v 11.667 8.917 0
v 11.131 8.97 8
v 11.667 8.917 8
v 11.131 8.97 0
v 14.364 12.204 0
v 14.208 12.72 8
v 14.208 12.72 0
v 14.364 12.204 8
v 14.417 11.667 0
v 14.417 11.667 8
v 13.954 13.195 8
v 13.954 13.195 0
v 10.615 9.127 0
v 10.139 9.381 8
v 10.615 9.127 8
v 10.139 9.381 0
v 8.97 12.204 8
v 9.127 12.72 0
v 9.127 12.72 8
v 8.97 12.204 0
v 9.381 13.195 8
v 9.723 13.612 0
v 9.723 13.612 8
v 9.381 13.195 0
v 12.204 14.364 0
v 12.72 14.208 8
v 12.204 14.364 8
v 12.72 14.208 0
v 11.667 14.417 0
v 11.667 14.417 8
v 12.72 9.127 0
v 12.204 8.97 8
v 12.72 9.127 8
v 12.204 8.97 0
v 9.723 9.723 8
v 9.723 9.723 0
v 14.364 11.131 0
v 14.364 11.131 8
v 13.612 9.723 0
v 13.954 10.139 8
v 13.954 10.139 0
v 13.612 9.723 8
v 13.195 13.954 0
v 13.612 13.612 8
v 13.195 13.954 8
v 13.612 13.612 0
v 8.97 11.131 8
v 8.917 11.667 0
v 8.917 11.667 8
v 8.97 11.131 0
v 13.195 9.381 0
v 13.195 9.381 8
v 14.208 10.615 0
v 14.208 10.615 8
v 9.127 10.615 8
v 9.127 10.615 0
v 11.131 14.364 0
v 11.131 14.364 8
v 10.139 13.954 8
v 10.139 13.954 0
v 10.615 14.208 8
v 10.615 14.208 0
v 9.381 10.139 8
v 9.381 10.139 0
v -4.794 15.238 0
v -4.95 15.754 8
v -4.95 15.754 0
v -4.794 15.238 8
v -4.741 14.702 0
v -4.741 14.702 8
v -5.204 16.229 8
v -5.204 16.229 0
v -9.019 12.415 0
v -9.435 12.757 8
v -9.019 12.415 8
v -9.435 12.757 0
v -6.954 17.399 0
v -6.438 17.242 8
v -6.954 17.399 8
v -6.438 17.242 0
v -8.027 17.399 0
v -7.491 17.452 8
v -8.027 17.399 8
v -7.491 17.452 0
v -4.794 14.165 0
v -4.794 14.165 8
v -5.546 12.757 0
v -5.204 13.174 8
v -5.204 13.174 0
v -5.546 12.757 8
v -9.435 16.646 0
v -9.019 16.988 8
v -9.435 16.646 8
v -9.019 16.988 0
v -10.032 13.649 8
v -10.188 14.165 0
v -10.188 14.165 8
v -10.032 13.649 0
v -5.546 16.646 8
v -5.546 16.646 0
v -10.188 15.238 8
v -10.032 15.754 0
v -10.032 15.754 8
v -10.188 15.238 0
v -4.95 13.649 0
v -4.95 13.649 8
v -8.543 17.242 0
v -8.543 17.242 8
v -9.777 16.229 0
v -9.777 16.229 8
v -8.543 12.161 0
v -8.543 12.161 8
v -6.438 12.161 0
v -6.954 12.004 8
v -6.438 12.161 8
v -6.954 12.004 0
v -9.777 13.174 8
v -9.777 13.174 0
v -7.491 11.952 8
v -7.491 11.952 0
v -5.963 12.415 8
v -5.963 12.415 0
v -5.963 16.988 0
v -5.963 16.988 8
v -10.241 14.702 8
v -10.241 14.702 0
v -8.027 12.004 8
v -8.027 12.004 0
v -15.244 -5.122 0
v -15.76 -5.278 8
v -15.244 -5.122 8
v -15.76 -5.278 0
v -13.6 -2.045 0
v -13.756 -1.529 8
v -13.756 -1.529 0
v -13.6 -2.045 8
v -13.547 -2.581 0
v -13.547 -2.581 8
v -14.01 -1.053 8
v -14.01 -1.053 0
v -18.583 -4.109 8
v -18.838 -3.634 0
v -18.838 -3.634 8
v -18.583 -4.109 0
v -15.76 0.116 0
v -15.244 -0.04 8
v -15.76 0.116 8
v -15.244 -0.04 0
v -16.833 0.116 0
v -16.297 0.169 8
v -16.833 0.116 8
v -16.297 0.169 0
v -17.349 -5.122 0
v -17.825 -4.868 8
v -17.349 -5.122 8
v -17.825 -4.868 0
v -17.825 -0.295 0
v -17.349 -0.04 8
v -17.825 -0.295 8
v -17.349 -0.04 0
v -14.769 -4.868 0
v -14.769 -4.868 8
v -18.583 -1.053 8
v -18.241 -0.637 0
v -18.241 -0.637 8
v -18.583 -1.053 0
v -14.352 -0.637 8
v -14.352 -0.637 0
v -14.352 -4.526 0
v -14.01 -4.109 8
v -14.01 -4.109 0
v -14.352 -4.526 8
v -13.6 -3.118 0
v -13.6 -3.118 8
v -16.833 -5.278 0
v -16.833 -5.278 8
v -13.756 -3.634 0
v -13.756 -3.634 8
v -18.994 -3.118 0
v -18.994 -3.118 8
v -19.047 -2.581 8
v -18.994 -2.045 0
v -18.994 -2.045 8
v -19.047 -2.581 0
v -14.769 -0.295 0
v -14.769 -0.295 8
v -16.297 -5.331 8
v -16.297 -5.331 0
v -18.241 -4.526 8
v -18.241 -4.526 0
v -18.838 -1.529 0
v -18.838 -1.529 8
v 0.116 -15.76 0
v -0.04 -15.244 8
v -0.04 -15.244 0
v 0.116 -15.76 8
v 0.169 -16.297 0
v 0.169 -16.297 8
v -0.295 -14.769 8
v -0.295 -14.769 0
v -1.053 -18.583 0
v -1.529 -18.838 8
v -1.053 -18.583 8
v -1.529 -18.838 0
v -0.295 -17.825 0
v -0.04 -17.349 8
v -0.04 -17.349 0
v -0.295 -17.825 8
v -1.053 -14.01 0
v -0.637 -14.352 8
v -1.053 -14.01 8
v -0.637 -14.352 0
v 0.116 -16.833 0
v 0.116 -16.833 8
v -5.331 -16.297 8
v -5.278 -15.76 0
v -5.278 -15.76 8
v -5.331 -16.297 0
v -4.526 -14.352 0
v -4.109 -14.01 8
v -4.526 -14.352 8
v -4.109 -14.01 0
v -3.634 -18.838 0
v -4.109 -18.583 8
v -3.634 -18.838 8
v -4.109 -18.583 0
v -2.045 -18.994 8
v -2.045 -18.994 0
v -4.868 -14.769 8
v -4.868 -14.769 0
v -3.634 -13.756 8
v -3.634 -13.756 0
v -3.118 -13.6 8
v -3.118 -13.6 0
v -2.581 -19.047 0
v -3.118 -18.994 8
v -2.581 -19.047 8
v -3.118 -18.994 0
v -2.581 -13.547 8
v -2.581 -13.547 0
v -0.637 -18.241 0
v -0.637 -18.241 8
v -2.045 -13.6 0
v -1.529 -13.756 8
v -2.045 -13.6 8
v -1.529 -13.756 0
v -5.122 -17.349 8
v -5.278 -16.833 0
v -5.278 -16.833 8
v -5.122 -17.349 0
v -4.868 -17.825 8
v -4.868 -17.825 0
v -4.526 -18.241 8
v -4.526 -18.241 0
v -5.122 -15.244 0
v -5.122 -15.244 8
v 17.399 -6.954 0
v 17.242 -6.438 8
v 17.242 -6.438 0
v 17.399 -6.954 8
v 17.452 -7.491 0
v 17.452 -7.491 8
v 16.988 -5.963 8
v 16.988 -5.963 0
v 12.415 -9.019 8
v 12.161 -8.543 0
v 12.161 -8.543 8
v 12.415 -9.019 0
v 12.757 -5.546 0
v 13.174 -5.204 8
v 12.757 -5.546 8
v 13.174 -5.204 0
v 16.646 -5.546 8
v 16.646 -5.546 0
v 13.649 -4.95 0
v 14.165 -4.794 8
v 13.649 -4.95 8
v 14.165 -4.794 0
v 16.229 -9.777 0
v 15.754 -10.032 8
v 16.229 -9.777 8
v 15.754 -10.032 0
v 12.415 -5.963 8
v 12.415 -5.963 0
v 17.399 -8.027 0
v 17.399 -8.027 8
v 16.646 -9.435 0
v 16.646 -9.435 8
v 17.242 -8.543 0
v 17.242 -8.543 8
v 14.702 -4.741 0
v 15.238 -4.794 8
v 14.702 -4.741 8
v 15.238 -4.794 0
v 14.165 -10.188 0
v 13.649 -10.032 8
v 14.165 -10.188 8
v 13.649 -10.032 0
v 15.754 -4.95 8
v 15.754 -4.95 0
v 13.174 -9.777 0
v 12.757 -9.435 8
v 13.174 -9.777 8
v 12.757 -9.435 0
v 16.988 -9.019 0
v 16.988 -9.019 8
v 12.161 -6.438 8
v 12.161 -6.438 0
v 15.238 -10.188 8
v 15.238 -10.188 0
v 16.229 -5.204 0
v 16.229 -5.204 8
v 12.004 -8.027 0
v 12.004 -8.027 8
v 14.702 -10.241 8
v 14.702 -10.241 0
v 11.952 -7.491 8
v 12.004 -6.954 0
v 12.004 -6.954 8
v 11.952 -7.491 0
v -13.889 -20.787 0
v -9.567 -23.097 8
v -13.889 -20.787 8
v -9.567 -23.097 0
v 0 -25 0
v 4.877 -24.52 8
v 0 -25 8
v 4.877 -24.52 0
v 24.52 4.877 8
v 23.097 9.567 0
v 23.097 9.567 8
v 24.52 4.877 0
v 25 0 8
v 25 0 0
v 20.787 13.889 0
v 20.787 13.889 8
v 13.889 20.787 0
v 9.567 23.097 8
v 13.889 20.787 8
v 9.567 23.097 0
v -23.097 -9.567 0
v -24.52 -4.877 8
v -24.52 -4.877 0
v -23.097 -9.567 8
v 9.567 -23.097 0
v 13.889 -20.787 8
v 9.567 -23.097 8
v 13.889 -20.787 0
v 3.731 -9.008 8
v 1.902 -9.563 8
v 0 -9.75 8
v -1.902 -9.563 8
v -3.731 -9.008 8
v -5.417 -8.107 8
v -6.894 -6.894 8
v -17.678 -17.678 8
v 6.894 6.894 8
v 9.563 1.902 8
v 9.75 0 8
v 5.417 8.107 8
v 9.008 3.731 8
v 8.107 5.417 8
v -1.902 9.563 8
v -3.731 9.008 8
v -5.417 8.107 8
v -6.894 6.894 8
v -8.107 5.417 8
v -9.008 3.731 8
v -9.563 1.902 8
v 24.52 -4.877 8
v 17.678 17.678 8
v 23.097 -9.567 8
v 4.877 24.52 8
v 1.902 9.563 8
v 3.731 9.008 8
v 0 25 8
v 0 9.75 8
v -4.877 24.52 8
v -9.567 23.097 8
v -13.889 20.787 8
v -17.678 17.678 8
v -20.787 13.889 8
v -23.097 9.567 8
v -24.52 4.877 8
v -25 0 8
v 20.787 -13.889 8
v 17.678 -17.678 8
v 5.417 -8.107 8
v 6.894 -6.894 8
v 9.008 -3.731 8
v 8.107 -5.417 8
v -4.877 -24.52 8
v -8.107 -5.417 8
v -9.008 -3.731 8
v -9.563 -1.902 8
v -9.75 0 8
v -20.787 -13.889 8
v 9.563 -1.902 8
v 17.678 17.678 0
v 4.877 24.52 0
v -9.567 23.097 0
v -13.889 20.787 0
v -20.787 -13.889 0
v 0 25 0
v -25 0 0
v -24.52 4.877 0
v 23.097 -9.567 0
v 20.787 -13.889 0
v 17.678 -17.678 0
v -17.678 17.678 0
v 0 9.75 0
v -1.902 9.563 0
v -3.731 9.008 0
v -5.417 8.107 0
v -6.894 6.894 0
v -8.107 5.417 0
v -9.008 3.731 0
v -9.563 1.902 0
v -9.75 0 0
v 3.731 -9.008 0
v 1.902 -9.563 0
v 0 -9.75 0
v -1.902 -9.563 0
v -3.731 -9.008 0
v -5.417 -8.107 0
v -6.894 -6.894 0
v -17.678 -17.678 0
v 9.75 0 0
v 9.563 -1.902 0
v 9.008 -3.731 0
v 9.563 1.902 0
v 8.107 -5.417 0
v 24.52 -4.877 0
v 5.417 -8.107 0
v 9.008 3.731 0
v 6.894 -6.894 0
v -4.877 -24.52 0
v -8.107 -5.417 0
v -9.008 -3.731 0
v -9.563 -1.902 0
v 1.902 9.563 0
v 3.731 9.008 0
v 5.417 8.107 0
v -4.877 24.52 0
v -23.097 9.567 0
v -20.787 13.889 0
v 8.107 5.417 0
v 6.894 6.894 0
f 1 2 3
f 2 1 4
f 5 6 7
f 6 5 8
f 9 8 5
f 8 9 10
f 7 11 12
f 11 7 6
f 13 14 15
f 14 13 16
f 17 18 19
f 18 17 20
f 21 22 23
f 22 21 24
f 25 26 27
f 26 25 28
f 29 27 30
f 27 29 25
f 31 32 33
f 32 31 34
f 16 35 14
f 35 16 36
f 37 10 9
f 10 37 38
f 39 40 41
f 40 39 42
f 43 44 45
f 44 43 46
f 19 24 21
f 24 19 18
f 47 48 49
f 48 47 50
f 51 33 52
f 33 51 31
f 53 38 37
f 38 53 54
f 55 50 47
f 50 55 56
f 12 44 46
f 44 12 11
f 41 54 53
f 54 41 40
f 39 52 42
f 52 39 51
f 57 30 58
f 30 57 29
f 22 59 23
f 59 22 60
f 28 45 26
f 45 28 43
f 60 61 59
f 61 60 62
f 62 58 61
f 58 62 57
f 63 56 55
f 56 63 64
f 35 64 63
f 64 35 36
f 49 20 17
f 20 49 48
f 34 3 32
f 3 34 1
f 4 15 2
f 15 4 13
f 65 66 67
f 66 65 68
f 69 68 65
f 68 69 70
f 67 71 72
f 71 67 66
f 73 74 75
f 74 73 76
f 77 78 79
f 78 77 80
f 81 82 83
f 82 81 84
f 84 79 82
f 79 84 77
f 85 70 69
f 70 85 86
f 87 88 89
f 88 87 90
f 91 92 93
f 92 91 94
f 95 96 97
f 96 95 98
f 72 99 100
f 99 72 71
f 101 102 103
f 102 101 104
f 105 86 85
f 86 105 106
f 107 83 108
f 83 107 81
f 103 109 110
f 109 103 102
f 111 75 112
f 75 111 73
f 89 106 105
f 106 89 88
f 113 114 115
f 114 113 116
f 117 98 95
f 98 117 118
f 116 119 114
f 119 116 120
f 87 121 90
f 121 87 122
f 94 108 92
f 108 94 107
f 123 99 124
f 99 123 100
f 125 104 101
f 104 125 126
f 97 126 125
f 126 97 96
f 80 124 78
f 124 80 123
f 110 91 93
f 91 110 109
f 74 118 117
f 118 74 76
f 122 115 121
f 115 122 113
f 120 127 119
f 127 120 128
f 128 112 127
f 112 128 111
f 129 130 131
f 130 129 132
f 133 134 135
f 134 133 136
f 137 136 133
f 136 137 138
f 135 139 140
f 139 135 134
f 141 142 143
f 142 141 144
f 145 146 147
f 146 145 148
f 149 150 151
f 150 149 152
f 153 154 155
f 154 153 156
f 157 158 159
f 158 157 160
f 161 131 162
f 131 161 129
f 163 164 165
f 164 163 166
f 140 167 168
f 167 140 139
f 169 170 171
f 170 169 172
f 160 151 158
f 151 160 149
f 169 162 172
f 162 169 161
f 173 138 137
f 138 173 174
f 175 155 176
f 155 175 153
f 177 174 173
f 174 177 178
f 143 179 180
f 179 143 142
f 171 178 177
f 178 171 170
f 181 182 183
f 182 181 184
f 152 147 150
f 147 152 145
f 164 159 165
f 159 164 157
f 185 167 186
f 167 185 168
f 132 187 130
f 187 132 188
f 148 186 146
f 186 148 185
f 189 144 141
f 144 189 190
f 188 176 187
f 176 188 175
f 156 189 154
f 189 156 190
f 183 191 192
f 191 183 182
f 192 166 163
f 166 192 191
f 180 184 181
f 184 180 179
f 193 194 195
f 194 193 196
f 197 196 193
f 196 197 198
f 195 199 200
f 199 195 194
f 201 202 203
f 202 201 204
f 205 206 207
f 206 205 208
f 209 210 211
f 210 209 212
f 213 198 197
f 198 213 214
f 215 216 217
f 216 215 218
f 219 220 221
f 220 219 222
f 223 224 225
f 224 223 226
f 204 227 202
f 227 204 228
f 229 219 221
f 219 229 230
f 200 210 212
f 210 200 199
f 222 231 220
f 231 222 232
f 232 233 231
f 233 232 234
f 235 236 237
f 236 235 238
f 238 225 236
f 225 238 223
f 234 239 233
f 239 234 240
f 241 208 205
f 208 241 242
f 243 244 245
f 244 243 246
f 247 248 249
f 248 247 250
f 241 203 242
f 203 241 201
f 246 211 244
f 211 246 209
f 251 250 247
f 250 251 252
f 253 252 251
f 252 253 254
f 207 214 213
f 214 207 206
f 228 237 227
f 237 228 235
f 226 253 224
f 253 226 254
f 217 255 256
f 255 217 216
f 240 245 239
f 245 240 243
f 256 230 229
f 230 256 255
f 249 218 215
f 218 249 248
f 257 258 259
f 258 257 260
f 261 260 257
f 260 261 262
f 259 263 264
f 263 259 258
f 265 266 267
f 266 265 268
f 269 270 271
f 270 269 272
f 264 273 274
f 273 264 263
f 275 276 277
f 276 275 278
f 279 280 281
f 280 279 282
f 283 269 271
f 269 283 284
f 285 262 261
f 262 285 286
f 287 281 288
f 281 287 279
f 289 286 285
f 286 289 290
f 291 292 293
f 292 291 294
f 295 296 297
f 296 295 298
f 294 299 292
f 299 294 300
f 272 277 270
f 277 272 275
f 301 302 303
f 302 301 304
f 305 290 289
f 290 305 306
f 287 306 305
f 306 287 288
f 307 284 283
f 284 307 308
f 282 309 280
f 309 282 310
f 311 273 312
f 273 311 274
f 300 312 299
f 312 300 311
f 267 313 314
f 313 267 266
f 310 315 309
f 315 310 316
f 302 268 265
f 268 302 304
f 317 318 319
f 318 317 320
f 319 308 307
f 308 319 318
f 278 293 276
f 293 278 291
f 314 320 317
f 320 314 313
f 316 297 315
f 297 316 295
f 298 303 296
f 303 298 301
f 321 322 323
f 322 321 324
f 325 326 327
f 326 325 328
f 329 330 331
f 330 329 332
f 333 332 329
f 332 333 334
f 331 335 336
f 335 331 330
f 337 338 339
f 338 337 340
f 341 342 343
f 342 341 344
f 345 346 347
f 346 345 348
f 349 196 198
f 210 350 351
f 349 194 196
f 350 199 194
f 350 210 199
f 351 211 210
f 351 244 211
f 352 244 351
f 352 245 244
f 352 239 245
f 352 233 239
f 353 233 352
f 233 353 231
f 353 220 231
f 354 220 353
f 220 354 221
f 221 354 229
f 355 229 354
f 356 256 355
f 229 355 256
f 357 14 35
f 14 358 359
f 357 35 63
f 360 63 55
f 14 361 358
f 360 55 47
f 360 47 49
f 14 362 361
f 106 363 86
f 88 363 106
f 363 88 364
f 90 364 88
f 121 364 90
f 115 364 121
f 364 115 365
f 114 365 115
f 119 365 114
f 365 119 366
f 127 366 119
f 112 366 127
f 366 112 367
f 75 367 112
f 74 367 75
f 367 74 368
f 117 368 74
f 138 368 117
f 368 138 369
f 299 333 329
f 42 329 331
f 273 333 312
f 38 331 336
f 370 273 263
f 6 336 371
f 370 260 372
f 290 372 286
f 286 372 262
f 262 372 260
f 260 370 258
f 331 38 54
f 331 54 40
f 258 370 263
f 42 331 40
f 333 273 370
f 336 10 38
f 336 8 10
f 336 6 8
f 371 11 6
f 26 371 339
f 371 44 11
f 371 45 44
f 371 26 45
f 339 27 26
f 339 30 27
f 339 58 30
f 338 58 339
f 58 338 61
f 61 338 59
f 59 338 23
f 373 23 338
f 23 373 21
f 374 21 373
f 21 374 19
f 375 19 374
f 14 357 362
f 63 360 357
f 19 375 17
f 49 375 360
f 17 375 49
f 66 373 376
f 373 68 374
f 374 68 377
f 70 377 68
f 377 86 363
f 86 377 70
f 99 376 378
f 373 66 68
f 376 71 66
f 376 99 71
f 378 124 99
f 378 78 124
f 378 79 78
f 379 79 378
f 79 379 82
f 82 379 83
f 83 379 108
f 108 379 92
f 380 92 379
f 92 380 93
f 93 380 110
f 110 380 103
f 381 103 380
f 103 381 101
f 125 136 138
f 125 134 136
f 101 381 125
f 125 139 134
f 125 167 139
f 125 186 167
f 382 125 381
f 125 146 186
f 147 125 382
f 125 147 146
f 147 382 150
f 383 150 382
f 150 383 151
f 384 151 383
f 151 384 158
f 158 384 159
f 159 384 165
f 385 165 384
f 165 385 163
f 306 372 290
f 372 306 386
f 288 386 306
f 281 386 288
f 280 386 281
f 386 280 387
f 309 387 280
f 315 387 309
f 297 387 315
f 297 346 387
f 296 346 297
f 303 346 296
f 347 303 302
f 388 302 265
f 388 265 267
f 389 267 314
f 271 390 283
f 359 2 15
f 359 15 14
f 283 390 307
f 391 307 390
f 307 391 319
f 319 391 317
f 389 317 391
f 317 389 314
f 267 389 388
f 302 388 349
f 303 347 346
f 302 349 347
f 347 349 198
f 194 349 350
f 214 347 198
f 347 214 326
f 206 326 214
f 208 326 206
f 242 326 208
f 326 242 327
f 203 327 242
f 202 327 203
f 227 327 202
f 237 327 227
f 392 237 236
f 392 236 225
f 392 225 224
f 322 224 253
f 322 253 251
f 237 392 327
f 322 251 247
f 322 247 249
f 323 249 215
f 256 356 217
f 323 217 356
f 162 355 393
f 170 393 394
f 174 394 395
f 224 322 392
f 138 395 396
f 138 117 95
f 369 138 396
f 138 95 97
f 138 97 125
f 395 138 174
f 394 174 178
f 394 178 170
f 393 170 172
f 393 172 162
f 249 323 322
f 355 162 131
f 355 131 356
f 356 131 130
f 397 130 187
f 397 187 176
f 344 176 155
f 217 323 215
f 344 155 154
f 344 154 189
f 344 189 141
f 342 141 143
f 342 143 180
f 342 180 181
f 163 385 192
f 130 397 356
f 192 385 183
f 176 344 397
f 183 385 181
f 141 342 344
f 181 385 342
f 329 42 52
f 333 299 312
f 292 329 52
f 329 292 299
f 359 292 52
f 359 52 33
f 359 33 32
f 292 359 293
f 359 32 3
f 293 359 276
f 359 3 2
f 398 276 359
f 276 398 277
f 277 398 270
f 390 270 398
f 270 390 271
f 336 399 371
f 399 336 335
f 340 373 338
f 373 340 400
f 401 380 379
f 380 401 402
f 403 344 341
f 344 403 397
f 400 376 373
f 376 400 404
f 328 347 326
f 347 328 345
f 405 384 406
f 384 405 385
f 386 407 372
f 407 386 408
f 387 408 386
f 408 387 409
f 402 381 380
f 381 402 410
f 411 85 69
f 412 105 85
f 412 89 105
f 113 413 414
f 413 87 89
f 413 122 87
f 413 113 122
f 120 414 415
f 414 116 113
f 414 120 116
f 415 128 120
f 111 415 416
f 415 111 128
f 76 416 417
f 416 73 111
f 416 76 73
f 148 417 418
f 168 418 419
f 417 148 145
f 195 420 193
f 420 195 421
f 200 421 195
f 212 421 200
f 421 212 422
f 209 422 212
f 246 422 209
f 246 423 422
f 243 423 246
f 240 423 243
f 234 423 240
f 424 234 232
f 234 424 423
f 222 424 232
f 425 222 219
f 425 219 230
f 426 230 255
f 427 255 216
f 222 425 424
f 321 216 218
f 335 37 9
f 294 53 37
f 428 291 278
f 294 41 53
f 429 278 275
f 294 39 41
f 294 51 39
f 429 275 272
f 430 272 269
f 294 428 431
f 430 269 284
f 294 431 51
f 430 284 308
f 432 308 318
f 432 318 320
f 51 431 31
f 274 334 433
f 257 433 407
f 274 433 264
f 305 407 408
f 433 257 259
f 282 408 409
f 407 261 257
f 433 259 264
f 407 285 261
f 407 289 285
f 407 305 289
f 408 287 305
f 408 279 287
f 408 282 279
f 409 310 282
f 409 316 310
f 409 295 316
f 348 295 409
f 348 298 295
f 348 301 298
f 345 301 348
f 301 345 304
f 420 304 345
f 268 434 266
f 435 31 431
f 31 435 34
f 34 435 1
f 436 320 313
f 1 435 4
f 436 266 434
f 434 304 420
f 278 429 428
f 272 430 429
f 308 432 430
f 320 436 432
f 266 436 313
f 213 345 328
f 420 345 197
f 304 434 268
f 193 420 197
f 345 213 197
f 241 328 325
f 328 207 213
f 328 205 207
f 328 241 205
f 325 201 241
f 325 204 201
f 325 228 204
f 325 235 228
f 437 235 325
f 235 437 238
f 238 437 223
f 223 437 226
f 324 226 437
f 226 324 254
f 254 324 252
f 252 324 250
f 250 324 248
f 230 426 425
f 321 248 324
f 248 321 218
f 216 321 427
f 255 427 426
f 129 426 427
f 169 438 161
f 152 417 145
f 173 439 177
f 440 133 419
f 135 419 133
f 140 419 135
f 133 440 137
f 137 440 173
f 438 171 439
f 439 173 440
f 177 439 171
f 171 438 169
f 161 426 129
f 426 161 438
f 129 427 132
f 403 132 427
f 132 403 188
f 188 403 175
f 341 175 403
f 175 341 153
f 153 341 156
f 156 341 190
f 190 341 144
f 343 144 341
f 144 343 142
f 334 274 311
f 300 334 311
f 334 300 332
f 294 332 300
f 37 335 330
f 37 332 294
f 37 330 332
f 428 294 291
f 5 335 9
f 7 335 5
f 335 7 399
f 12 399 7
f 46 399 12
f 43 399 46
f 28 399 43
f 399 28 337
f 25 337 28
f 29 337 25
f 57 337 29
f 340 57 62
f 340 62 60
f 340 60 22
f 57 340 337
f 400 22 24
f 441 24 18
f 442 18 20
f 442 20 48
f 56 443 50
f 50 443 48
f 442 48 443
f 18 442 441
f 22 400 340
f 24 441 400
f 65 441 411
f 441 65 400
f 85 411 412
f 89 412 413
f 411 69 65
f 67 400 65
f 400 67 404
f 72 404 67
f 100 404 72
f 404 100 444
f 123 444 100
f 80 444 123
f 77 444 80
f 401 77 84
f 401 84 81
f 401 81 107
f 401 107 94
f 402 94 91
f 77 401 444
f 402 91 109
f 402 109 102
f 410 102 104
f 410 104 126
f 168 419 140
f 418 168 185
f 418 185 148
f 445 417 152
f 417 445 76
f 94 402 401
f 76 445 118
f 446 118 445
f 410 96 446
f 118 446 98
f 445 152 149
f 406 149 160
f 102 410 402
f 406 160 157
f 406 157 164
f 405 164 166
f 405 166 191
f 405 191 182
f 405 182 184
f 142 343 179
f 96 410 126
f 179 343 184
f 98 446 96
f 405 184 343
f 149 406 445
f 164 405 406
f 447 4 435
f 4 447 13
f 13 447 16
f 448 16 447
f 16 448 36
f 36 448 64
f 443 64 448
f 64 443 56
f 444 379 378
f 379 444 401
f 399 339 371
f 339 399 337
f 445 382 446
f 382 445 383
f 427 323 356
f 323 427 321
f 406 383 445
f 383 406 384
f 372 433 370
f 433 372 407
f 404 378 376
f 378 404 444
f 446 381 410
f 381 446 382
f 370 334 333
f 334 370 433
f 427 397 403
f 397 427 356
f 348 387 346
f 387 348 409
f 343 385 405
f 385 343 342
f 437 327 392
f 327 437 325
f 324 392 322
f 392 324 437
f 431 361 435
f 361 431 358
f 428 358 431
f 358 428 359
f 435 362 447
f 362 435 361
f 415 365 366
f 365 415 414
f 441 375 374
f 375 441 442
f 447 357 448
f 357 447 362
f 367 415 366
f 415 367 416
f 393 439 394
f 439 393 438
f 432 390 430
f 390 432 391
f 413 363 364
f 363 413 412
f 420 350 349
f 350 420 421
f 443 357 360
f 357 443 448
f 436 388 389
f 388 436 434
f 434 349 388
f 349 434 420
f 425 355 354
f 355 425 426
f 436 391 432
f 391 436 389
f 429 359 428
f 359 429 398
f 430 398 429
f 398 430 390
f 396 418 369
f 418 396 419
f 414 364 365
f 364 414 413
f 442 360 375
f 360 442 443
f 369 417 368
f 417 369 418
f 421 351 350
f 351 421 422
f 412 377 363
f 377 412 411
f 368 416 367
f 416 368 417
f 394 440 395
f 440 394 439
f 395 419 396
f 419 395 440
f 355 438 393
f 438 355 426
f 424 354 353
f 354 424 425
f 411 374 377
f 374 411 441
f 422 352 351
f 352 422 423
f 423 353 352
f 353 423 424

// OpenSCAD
$fn = 32;

// ----------------------------------------------------------------------
// Flange Ø50 x 8
// 5 holes on a Ø33 bolt circle, bolted joints
// ----------------------------------------------------------------------

// --- parameters (mm) ---
flange_d = 50;   // outside diameter of the flange
thickness = 8;   // flange thickness
holes = 5;       // number of bolt holes
pcd = 33;        // bolt circle diameter
start_deg = 45;  // angle of the first hole, from +X
hole_d = 5.5;    // bolt hole diameter
bore_d = 19.5;   // central through bore
hub_d = 27.5;    // hub outside diameter
hub_h = 0;       // hub height above the flange face (0 = no hub)

// --- derived feature positions (mm) ---
height = thickness + hub_h;  // = 8   overall height of the part
pcd_r = pcd / 2;             // = 16.5   bolt circle radius
hole_step = 360 / holes;     // = 72   angular pitch
feature_centers = [
  [pcd_r * cos(start_deg + 0 * hole_step), pcd_r * sin(start_deg + 0 * hole_step)],
  [pcd_r * cos(start_deg + 1 * hole_step), pcd_r * sin(start_deg + 1 * hole_step)],
  [pcd_r * cos(start_deg + 2 * hole_step), pcd_r * sin(start_deg + 2 * hole_step)],
  [pcd_r * cos(start_deg + 3 * hole_step), pcd_r * sin(start_deg + 3 * hole_step)],
  [pcd_r * cos(start_deg + 4 * hole_step), pcd_r * sin(start_deg + 4 * hole_step)]
];   // bolt hole centres on the pitch circle

// flange disc, every hole and the bore cut straight through
difference() {
  union() {
    cylinder(d = flange_d, h = thickness);
  }
  translate([0, 0, -1]) cylinder(d = bore_d, h = height + 2);  // bore, through
  for (centre = feature_centers)
    translate([centre[0], centre[1], -1]) cylinder(d = hole_d, h = thickness + 2);
}
